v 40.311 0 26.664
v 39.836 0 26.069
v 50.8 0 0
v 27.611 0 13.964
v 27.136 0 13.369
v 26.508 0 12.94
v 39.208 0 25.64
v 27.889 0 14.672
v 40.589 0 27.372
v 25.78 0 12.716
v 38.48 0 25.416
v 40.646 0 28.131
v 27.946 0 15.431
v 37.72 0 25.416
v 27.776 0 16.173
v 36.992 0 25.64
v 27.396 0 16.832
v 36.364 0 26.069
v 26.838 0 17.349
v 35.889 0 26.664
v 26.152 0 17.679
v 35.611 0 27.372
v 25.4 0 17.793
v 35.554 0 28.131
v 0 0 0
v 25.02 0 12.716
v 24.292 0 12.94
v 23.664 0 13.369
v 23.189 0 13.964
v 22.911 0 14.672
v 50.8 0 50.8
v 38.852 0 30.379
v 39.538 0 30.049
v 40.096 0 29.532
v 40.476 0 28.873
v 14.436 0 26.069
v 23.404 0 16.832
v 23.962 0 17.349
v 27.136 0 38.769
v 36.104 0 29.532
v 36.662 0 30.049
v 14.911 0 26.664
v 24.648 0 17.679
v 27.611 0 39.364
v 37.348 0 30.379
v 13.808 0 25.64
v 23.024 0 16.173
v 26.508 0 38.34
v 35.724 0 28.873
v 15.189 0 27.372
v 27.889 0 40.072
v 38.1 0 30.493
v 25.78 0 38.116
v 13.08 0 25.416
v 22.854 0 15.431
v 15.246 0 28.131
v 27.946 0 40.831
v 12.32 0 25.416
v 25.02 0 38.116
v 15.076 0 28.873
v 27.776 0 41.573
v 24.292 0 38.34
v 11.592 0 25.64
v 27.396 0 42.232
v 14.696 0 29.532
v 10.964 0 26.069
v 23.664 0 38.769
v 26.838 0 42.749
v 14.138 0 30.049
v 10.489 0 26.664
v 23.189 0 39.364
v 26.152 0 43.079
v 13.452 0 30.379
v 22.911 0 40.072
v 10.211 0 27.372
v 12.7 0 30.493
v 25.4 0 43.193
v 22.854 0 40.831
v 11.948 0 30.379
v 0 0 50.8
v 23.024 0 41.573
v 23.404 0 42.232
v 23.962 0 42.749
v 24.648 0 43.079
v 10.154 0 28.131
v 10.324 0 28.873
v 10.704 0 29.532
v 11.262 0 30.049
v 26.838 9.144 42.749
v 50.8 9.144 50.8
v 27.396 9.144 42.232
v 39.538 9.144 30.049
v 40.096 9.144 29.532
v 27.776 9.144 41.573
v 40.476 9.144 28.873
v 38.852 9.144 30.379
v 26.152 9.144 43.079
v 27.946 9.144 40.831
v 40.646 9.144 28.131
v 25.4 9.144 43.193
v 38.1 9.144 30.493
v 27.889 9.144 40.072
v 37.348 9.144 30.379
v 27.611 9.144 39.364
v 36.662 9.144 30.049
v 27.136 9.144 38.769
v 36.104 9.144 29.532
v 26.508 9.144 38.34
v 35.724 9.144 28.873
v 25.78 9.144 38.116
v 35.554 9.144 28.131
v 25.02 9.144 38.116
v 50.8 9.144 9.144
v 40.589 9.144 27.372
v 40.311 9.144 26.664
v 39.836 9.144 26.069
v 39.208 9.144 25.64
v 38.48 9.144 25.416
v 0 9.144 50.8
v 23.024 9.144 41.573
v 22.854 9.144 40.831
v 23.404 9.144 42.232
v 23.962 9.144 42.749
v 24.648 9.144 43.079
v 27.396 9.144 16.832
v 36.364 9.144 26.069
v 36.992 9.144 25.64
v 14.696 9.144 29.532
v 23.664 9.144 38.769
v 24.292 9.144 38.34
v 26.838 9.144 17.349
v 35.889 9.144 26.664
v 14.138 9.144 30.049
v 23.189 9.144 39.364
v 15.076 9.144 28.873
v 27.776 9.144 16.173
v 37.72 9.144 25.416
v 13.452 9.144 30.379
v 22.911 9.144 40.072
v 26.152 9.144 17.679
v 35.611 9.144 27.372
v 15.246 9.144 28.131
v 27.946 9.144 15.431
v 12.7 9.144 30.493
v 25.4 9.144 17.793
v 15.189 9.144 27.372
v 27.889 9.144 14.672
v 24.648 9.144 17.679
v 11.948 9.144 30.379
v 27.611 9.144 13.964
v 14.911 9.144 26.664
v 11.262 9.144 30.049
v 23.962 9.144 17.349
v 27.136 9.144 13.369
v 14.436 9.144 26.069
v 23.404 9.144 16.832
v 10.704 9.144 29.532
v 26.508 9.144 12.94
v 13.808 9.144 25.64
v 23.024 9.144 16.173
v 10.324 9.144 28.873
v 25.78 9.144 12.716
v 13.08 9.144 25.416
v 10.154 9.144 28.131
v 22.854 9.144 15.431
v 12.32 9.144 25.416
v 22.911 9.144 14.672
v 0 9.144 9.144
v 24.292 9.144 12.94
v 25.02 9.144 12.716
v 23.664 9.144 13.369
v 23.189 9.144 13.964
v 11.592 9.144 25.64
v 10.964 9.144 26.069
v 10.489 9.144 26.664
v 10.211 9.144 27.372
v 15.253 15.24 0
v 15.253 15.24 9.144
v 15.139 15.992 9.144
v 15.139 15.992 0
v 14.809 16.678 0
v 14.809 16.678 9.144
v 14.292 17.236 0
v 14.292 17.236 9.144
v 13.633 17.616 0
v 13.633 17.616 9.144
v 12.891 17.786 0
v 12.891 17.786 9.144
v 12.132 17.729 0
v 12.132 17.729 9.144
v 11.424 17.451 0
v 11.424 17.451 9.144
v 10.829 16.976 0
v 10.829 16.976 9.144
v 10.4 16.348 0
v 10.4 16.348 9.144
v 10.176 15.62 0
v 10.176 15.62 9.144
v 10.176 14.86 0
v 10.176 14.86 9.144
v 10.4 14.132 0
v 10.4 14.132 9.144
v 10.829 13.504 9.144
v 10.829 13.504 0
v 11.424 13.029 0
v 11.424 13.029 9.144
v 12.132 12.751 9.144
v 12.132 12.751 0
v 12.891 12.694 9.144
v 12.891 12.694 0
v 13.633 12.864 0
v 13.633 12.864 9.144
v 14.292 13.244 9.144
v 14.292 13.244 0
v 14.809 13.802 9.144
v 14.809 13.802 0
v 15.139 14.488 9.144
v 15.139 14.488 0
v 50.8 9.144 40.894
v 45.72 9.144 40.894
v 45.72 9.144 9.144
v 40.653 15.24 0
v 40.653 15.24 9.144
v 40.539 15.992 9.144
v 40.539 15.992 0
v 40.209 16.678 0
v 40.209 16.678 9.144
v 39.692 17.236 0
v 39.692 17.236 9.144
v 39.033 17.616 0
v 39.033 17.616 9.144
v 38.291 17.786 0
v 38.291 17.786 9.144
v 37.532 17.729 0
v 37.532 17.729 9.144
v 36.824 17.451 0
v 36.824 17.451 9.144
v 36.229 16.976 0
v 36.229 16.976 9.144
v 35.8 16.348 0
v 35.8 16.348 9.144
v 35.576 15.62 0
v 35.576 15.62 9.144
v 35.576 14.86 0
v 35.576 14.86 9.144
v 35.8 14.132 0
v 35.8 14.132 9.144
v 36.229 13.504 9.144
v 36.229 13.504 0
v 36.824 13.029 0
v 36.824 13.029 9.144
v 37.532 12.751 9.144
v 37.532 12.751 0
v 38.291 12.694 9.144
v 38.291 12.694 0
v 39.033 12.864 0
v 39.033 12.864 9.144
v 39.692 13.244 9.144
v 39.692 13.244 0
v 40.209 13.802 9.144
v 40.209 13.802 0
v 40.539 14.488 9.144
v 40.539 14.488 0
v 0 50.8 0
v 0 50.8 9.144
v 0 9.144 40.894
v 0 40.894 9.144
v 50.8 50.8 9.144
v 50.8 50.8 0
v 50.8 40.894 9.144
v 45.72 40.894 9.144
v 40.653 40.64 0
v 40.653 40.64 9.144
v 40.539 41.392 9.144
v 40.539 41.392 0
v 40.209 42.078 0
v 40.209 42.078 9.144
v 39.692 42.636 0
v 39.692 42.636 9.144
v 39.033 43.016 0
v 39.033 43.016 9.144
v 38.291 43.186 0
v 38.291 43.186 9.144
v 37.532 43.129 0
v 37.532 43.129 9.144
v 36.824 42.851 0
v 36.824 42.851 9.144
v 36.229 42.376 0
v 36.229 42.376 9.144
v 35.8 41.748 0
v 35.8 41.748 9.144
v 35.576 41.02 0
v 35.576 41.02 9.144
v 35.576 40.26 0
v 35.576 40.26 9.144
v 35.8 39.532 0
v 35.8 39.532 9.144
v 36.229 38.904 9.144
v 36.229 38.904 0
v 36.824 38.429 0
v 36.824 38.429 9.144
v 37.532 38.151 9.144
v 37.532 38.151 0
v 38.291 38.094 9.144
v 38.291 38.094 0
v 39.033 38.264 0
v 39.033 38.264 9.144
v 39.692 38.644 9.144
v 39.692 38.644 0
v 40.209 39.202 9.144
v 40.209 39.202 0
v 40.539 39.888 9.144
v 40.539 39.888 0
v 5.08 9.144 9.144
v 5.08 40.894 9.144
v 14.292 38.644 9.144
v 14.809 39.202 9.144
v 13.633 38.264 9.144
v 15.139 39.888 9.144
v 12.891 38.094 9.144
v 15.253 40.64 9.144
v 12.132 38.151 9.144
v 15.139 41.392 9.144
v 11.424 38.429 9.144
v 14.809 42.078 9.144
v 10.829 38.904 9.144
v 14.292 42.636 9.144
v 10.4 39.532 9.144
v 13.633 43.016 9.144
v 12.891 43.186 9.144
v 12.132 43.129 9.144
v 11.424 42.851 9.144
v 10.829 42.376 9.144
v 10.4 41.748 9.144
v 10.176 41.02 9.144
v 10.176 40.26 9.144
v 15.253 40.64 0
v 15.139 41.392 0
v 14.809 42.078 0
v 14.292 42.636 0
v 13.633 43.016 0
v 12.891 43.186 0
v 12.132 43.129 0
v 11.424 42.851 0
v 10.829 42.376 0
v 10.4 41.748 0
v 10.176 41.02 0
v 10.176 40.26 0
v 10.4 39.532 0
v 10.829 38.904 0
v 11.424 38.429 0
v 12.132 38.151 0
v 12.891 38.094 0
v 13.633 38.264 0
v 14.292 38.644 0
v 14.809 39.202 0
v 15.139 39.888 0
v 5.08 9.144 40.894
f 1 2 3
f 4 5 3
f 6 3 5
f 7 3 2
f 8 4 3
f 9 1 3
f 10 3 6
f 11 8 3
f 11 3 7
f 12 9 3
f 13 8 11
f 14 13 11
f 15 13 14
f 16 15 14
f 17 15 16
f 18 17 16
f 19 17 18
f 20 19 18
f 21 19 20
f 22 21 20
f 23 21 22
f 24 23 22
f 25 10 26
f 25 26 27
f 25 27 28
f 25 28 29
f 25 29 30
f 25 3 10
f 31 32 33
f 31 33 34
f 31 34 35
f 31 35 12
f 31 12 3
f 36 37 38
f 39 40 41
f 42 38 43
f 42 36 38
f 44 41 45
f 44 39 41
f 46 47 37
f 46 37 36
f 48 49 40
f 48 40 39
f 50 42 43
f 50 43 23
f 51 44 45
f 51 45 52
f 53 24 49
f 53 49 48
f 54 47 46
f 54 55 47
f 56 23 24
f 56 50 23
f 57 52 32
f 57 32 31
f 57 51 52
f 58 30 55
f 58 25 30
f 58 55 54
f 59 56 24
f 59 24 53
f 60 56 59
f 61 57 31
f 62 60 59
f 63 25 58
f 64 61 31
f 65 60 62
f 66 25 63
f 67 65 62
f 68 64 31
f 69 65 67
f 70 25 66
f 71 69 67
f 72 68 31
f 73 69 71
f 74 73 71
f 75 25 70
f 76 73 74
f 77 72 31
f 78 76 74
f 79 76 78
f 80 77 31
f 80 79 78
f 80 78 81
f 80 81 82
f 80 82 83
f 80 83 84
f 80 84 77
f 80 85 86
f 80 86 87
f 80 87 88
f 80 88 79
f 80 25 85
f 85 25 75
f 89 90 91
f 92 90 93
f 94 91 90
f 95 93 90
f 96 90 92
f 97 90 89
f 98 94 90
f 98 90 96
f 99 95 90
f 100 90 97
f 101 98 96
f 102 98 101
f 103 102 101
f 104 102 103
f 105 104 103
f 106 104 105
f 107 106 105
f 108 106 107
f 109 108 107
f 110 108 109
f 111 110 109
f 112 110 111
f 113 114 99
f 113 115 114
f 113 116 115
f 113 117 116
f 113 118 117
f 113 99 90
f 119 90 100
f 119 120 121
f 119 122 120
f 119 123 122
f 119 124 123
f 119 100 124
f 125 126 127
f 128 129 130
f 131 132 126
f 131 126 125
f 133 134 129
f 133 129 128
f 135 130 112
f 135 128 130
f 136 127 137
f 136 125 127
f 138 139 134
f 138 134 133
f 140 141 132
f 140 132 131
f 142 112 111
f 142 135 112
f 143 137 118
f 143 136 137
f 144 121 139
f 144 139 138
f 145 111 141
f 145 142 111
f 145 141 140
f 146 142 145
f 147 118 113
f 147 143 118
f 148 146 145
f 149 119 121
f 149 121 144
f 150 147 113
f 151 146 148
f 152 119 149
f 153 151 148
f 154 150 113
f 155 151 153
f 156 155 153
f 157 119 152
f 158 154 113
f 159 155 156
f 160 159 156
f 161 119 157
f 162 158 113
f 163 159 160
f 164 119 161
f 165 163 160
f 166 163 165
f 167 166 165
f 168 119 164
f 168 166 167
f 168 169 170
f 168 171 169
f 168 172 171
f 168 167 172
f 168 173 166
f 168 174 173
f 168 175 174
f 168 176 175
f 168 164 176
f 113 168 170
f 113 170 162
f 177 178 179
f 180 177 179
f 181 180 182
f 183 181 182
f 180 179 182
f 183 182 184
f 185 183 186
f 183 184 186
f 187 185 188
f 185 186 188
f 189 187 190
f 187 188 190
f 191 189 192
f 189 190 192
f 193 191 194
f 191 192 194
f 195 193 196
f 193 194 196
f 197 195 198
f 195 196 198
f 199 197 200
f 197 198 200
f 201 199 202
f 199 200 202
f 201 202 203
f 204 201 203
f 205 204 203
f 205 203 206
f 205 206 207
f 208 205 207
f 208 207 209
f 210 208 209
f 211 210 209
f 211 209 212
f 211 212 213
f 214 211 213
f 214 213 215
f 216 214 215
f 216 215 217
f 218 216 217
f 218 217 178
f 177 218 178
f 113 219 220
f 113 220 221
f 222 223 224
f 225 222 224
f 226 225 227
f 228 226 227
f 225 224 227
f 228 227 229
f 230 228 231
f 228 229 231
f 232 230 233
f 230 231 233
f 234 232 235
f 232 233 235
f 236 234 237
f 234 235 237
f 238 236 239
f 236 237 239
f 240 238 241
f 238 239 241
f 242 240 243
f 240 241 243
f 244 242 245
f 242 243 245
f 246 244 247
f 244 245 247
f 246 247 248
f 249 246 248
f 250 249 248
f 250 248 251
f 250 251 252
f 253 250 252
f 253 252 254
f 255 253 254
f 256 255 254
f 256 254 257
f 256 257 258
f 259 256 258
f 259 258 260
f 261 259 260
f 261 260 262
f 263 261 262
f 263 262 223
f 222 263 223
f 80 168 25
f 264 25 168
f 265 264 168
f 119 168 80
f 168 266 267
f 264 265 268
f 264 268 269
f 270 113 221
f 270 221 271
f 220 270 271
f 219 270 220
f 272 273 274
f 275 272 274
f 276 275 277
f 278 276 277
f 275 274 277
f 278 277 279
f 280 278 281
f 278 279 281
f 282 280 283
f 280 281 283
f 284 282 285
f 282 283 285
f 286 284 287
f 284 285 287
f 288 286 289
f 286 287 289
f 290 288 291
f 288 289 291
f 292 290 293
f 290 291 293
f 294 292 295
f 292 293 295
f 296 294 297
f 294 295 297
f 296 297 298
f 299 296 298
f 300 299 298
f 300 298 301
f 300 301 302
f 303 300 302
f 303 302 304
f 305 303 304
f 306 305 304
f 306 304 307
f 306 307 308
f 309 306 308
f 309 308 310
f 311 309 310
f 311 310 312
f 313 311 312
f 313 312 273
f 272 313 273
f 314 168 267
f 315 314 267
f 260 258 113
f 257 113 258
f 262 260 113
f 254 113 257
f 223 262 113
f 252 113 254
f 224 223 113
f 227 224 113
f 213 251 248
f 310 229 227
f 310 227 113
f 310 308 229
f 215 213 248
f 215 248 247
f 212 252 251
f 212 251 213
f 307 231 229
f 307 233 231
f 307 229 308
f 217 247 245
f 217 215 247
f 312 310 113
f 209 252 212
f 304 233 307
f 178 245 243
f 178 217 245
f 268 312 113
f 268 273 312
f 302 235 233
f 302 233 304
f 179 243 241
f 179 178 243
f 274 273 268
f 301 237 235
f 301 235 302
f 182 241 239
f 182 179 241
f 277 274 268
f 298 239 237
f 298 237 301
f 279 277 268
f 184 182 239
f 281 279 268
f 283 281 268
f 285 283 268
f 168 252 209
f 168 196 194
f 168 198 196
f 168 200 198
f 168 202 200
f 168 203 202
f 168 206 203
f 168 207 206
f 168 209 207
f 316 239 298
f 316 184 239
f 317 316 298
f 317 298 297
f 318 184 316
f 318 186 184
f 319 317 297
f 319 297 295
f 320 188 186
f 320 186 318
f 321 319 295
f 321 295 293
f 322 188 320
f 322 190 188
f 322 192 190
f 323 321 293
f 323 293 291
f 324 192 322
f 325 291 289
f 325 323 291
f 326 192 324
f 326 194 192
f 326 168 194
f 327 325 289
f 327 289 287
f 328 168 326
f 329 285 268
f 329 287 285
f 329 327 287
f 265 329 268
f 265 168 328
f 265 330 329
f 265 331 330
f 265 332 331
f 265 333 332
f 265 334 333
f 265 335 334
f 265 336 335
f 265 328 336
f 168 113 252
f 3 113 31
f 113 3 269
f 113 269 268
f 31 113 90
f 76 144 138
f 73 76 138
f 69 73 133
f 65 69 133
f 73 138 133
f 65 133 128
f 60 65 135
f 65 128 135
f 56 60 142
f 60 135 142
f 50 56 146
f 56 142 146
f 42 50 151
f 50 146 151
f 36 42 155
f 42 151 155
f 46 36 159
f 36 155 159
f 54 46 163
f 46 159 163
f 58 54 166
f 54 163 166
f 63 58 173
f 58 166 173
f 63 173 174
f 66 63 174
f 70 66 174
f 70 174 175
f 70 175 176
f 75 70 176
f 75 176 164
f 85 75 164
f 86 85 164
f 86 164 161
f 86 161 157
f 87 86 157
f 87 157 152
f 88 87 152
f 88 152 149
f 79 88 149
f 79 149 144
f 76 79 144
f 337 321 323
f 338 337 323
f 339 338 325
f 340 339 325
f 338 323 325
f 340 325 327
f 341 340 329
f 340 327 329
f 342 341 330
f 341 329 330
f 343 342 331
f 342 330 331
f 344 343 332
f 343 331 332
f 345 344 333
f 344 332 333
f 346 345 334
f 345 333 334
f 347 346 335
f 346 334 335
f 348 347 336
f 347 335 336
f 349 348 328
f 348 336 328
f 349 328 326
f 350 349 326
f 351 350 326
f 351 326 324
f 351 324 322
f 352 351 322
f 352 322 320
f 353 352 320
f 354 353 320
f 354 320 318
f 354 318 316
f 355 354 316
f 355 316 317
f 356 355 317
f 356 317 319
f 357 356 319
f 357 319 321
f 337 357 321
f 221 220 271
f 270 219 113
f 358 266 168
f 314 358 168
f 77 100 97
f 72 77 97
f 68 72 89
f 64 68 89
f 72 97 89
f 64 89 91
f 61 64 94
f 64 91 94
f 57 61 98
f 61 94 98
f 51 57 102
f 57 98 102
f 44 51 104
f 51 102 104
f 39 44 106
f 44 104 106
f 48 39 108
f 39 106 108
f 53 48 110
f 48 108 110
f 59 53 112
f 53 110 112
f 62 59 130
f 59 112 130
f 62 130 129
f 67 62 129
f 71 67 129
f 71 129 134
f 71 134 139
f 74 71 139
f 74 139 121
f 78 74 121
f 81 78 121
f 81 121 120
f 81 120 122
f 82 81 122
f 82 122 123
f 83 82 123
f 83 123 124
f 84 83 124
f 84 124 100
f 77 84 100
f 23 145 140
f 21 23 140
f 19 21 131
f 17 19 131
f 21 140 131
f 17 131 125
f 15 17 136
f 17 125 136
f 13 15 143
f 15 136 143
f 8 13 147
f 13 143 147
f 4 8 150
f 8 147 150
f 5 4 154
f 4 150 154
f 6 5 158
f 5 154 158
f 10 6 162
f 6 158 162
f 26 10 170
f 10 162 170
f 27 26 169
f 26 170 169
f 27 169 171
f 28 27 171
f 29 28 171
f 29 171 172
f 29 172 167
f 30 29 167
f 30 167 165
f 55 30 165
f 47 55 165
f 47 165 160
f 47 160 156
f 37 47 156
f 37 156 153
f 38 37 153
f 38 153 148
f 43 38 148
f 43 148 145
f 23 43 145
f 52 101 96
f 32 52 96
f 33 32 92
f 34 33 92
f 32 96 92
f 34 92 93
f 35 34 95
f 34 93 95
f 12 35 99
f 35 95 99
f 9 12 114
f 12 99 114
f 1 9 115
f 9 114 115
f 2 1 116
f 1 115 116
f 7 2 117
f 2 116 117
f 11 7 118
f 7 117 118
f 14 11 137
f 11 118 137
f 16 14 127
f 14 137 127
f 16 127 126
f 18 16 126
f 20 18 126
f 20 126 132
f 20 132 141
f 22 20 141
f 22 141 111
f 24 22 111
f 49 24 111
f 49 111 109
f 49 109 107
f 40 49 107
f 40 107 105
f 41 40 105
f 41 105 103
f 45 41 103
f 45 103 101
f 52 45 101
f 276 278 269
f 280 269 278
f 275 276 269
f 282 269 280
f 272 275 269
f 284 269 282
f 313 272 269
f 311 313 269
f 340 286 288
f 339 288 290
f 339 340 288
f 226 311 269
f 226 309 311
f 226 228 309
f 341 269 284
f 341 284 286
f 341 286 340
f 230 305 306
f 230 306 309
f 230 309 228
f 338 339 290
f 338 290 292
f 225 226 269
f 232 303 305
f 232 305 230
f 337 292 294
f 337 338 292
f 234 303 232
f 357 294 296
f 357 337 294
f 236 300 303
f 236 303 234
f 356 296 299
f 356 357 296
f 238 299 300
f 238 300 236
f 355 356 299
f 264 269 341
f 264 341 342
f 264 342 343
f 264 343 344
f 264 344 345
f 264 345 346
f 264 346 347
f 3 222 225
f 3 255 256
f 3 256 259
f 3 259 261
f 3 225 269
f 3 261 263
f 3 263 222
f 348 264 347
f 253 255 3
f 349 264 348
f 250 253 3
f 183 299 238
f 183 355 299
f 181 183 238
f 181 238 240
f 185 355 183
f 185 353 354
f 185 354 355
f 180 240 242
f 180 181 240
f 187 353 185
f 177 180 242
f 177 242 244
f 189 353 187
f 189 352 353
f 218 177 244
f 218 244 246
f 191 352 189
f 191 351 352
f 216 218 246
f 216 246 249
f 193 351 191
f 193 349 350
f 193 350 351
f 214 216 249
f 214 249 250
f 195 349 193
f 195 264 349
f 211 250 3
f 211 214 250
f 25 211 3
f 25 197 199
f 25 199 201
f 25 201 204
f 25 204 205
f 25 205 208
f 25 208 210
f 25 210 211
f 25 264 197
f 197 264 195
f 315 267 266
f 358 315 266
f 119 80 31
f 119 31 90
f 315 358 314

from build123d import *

# Parameters (mm, degrees)
BOSS_EXTRUDE1_DEPTH         = 50.8
F_1_4_20_TAPPED_HOLE2_D     = 5.1054
F_1_4_20_TAPPED_HOLE2_DEPTH = 16.51
F_1_4_20_TAPPED_HOLE2_TIP   = 1.533816902
F_1_4_20_TAPPED_HOLE3_D     = 5.1054
F_1_4_20_TAPPED_HOLE3_DEPTH = 16.51
F_1_4_20_TAPPED_HOLE3_TIP   = 1.533816902
BOSS_EXTRUDE2_DEPTH         = 5.08
BOSS_EXTRUDE3_START         = 50.8
BOSS_EXTRUDE3_DEPTH         = 5.08


with BuildPart() as part:
    # Sketch1 → Boss-Extrude1 (new body)
    with BuildSketch(Plane(origin=(0, 0, 0), x_dir=(0, 0, -1), z_dir=(1, 0, 0))):
        Polygon((0, 0), (-50.8, 0), (-50.8, 9.144), (-9.144, 9.144), (-9.144, 50.8), (0, 50.8), align=None)
    extrude(amount=BOSS_EXTRUDE1_DEPTH)

    # 1_4-20 Tapped Hole2
    with Locations(Plane(origin=(25.4, 0, 40.64), x_dir=(0, 0, -1), z_dir=(0, -1, 0))):
        with Locations((0, 0), (12.7, 12.7), (12.7, -12.7), (25.4, 0)):
            Hole(F_1_4_20_TAPPED_HOLE2_D / 2, depth=F_1_4_20_TAPPED_HOLE2_DEPTH)
            with Locations((0, 0, -(F_1_4_20_TAPPED_HOLE2_DEPTH + F_1_4_20_TAPPED_HOLE2_TIP / 2))):  # 118° drill point
                Cone(0, F_1_4_20_TAPPED_HOLE2_D / 2, F_1_4_20_TAPPED_HOLE2_TIP, mode=Mode.SUBTRACT)

    # 1_4-20 Tapped Hole3
    with Locations(Plane(origin=(12.7, 40.64, 0), x_dir=(-1, 0, 0), z_dir=(0, 0, -1))):
        with Locations((0, 0), (0, -25.4), (-25.4, -25.4), (-25.4, 0)):
            Hole(F_1_4_20_TAPPED_HOLE3_D / 2, depth=F_1_4_20_TAPPED_HOLE3_DEPTH)
            with Locations((0, 0, -(F_1_4_20_TAPPED_HOLE3_DEPTH + F_1_4_20_TAPPED_HOLE3_TIP / 2))):  # 118° drill point
                Cone(0, F_1_4_20_TAPPED_HOLE3_D / 2, F_1_4_20_TAPPED_HOLE3_TIP, mode=Mode.SUBTRACT)


with BuildPart() as body_2:
    # Sketch20 → Boss-Extrude2 (new body)
    with BuildSketch(Plane(origin=(0, 0, 0), x_dir=(0, 0, -1), z_dir=(1, 0, 0))):
        Polygon((-9.144, 9.144), (-9.144, 40.894), (-40.894, 9.144), align=None)
    extrude(amount=BOSS_EXTRUDE2_DEPTH)


with BuildPart() as body_3:
    # Sketch20_2 → Boss-Extrude3 (new body)
    with BuildSketch(Plane(origin=(0, 0, 0), x_dir=(0, 0, -1), z_dir=(1, 0, 0)).offset(BOSS_EXTRUDE3_START)):
        Polygon((-9.144, 9.144), (-9.144, 40.894), (-40.894, 9.144), align=None)
    extrude(amount=-BOSS_EXTRUDE3_DEPTH)


solid = Compound([part.part, body_2.part, body_3.part])
